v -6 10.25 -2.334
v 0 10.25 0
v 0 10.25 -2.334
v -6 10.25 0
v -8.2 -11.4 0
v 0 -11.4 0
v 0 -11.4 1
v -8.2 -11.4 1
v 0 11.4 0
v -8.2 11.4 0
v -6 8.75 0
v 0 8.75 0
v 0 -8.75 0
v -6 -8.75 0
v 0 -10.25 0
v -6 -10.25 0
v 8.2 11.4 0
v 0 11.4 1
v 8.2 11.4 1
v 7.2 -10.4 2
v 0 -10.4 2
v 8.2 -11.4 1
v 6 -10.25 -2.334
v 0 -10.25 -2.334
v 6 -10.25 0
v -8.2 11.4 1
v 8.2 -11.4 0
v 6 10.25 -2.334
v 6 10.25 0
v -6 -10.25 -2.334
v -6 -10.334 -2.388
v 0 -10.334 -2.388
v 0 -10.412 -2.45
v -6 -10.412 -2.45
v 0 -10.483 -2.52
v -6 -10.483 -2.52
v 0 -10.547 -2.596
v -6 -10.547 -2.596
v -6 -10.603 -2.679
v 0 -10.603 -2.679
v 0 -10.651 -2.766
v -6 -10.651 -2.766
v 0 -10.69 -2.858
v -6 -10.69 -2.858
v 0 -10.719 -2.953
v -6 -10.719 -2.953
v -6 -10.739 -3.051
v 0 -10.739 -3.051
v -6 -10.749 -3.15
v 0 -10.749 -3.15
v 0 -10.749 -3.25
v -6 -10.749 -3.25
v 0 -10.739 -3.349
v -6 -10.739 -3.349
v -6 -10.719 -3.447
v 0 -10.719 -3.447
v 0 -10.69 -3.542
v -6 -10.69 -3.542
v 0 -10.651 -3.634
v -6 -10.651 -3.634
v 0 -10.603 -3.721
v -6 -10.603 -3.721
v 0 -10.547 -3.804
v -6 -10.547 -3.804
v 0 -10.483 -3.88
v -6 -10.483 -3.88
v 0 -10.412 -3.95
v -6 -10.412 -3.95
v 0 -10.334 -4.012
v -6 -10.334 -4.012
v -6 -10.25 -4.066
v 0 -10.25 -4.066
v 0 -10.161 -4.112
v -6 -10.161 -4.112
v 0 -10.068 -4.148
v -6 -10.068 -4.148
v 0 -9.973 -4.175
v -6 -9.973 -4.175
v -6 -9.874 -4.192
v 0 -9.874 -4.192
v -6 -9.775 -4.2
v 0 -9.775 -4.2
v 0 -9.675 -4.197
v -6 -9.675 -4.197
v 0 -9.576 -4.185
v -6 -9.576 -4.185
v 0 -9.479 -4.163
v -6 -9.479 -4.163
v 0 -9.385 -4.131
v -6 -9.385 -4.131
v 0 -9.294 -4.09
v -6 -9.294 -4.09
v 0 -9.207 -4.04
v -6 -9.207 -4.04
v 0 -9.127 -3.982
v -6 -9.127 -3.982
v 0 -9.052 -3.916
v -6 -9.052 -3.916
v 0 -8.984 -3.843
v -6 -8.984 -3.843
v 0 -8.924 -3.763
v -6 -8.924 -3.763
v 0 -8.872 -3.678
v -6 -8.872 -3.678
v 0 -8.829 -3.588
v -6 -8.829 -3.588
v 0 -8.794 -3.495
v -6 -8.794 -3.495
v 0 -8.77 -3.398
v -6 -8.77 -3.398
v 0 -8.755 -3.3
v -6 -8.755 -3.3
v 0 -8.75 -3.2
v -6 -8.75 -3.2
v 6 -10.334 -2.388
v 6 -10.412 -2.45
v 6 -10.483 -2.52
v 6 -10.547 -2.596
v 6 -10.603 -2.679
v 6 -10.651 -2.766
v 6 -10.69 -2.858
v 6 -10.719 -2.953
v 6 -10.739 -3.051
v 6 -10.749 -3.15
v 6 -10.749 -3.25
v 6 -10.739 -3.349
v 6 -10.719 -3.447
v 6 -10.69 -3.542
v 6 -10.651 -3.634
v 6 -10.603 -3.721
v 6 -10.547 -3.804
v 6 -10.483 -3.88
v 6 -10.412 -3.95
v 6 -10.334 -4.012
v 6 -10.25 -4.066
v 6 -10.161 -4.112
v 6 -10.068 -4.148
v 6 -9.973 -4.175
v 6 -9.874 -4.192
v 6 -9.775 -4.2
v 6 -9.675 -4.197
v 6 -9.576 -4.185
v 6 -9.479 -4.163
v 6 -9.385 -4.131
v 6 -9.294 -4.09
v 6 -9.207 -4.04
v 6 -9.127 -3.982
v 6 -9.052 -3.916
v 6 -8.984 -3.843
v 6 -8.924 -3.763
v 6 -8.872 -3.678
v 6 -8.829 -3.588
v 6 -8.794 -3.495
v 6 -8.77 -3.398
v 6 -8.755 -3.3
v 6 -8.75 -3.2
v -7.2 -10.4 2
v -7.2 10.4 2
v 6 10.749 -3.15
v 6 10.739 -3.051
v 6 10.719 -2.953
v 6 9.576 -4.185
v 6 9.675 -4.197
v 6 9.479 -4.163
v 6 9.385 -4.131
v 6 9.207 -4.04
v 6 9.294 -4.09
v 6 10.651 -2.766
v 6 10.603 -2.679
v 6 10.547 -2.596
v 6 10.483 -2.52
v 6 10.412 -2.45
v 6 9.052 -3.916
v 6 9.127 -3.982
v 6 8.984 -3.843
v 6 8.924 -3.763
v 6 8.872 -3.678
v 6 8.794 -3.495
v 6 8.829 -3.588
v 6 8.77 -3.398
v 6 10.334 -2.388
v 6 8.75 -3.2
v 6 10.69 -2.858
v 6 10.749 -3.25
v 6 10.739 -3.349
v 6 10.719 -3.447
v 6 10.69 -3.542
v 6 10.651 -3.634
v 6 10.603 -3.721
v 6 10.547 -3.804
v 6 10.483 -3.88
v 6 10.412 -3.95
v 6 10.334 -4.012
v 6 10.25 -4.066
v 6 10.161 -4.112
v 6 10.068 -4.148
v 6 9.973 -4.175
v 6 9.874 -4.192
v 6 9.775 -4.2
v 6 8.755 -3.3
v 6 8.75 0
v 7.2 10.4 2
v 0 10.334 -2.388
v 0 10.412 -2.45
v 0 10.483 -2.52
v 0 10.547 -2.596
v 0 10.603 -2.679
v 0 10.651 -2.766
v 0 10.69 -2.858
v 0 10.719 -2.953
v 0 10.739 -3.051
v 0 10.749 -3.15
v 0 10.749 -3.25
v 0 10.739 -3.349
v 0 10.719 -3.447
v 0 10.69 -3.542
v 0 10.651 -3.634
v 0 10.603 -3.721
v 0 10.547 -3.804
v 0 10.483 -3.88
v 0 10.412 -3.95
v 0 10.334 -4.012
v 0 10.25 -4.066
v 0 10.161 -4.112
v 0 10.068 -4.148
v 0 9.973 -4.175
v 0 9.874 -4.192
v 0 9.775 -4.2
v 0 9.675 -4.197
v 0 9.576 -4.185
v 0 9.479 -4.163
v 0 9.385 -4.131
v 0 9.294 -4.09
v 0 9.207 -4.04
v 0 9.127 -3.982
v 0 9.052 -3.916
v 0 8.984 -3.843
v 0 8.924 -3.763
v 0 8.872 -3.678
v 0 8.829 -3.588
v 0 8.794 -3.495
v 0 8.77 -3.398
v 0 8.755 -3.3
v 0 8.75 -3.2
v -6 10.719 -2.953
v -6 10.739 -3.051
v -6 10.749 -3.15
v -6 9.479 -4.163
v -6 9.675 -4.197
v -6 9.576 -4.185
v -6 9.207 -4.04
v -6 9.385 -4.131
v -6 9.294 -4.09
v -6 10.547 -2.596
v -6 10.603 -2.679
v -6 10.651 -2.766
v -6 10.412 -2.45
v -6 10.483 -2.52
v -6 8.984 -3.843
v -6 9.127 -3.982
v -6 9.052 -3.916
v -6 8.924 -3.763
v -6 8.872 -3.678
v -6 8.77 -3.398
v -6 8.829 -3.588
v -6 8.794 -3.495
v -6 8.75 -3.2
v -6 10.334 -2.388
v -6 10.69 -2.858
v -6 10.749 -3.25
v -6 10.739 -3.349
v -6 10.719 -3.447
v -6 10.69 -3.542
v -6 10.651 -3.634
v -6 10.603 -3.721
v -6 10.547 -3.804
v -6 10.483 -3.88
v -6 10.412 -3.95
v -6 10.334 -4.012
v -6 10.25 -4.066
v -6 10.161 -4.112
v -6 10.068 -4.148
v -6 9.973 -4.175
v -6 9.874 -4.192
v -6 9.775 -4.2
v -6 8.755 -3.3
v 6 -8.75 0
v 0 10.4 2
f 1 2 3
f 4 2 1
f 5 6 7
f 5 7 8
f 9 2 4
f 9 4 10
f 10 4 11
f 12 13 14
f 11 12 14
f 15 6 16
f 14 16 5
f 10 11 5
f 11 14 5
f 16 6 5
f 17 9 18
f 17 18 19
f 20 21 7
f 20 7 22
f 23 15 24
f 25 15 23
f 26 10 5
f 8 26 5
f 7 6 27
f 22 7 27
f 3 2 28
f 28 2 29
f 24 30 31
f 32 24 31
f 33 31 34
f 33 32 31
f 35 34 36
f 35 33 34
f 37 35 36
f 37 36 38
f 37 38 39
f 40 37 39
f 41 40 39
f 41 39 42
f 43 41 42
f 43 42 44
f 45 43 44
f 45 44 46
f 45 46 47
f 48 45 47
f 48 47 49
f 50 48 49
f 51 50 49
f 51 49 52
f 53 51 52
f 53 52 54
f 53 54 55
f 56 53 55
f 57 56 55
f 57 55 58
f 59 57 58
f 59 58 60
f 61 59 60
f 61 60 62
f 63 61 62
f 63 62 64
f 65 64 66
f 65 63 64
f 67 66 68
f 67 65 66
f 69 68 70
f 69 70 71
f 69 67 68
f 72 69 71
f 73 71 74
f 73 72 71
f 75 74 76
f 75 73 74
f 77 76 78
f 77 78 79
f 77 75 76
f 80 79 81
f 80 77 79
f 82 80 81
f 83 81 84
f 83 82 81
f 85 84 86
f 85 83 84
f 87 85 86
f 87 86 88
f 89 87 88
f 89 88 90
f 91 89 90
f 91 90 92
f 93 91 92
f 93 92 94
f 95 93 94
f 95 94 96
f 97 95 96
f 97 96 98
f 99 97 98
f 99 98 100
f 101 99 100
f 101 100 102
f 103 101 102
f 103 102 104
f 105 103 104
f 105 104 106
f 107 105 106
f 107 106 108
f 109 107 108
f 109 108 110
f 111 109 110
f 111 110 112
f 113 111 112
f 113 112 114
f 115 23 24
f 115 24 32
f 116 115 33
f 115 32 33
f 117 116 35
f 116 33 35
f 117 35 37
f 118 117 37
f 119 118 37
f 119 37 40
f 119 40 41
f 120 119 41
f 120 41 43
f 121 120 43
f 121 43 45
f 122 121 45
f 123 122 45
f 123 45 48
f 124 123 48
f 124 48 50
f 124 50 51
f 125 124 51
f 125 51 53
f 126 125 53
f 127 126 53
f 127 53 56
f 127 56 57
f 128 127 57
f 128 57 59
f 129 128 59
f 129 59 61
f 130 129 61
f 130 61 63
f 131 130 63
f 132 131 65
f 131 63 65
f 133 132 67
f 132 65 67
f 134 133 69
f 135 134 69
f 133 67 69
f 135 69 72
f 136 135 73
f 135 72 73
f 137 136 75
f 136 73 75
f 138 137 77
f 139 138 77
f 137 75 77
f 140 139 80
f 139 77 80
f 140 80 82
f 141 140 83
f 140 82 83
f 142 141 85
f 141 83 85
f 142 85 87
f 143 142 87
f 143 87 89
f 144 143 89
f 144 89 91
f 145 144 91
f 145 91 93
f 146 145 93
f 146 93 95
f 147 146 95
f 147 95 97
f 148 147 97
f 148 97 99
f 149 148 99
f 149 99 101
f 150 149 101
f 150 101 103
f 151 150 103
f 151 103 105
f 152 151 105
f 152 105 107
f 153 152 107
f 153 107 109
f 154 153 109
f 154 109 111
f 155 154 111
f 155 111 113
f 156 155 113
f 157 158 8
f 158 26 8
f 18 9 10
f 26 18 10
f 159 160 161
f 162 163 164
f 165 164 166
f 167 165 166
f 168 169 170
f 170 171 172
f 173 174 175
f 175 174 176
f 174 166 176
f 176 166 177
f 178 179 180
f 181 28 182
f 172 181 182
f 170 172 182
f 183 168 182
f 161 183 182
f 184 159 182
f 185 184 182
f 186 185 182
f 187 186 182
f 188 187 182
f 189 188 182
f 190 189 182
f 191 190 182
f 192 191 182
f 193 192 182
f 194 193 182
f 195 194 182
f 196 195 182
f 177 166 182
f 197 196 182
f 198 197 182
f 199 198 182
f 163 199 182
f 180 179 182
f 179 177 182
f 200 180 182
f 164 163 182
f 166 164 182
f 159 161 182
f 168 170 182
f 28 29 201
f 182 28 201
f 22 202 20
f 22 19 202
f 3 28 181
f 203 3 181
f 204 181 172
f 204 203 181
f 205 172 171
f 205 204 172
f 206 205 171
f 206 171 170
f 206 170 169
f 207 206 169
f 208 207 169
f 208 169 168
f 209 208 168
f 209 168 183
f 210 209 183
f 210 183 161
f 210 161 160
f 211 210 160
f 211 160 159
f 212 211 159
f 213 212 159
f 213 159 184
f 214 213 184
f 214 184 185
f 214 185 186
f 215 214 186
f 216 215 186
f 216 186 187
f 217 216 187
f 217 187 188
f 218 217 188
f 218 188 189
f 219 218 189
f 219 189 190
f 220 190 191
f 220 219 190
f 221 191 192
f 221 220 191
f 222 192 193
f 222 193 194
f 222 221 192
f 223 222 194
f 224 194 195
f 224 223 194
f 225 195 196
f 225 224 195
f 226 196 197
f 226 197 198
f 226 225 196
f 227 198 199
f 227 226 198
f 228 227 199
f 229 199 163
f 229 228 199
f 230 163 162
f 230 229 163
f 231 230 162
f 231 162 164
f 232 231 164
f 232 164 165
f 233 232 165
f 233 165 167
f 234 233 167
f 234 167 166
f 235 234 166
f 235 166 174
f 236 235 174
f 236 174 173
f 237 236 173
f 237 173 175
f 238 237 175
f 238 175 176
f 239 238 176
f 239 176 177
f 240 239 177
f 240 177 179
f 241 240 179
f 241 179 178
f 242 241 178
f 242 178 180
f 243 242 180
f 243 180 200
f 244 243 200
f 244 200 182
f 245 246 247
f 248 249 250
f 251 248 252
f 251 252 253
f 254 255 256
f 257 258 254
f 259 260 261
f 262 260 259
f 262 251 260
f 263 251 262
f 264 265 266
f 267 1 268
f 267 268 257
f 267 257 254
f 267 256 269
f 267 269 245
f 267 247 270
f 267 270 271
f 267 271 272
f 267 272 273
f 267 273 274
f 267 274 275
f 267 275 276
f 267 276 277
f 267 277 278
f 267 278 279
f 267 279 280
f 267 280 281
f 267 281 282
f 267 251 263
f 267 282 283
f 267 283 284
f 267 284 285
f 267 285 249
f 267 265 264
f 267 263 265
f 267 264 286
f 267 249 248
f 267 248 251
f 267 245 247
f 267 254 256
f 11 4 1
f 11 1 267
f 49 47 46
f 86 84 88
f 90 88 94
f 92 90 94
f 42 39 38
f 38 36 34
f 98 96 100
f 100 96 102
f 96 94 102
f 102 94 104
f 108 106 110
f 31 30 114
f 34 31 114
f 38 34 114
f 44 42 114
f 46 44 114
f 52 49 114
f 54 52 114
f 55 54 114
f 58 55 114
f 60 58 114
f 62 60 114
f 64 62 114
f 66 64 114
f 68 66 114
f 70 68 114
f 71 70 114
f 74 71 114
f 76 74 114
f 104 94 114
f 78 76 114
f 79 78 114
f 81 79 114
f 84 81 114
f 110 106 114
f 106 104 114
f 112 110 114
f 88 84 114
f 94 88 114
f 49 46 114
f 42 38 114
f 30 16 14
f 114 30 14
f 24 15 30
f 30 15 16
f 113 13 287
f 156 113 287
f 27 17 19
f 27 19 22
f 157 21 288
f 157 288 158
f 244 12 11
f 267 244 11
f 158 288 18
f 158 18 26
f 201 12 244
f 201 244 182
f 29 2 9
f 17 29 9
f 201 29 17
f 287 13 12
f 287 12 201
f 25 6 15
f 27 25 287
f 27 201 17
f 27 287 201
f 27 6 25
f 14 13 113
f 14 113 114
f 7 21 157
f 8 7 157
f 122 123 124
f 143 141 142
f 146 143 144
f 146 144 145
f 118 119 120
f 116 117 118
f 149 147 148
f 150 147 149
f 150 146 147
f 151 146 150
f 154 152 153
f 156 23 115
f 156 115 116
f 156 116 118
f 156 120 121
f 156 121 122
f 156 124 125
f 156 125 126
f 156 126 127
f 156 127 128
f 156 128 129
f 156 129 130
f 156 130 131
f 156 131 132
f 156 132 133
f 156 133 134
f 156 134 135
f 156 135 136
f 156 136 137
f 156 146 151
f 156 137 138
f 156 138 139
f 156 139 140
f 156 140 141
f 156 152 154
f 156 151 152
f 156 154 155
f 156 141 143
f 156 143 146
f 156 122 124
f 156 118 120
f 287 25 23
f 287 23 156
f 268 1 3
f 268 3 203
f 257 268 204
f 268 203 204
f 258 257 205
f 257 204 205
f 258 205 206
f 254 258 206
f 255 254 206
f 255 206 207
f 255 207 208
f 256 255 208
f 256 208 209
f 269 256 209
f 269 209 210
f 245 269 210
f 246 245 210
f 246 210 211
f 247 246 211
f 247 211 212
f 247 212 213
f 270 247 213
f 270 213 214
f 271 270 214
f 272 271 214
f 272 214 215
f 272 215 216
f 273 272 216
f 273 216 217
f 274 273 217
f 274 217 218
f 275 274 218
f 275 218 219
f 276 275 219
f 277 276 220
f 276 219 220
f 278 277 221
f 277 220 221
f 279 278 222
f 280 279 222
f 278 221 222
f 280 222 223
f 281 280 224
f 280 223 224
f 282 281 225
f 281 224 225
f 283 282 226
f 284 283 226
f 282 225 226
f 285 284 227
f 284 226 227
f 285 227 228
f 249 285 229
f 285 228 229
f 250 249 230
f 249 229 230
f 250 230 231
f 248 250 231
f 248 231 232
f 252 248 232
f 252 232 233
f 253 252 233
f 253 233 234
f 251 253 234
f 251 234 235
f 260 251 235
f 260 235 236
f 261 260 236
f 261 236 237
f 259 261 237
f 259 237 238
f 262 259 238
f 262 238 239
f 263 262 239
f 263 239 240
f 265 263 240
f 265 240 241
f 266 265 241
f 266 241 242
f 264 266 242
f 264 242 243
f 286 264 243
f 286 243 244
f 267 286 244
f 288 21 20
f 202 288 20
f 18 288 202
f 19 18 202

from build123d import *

# Parameters (mm, degrees)
SKETCH_W     = 6
SKETCH_H     = 1.5
PAD_DEPTH    = 3.2
SKETCH001_W  = 8.2
SKETCH001_H  = 11.4
PAD001_DEPTH = 2
CHAMFER_SIZE = 1
SKETCH002_R  = 1
PAD002_DEPTH = 6


with BuildPart() as refine_fix001:
    # Sketch → Pad (new body)
    with BuildSketch(Plane.XY):
        with Locations((3, 9.5)):
            Rectangle(SKETCH_W, SKETCH_H)
    extrude(amount=-PAD_DEPTH)

    # Sketch001 → Pad001 (new body)
    with BuildSketch(Plane.XY):
        with Locations((4.1, 5.7)):
            Rectangle(SKETCH001_W, SKETCH001_H)
    extrude(amount=PAD001_DEPTH)

    # Chamfer
    chamfer_edges = [refine_fix001.edges().sort_by_distance(p)[0] for p in [
        (4.1, 11.4, 2),
        (8.2, 5.7, 2),
    ]]
    chamfer(chamfer_edges, length=CHAMFER_SIZE)

    # Sketch002 → Pad002 (new body)
    with BuildSketch(Plane(origin=(0, 0, 0), x_dir=(0, -1, 0), z_dir=(-1, 0, 0))):
        with Locations((-9.75, -3.2)):
            Circle(SKETCH002_R)
    extrude(amount=-PAD002_DEPTH)


with BuildPart() as part_mirroring:
    # Part__Mirroring: instance of refine_Fix001
    add(refine_fix001.part.mirror(Plane(origin=(0, 0, 0), x_dir=(1, 0, 0), z_dir=(0, 1, 0))))


with BuildPart() as fusion:
    # Fusion base: copy of refine_Fix001
    add(refine_fix001.part)

    # Fusion: union Part__Mirroring
    add(part_mirroring.part)


with BuildPart() as refine_mirroring:
    # Part__Mirroring001: instance of Fusion
    add(fusion.part.mirror(Plane(origin=(0, 0, 0), x_dir=(0, -1, 0), z_dir=(1, 0, 0))))

    # Fusion001: union Fusion
    add(fusion.part)


solid = refine_mirroring.part
